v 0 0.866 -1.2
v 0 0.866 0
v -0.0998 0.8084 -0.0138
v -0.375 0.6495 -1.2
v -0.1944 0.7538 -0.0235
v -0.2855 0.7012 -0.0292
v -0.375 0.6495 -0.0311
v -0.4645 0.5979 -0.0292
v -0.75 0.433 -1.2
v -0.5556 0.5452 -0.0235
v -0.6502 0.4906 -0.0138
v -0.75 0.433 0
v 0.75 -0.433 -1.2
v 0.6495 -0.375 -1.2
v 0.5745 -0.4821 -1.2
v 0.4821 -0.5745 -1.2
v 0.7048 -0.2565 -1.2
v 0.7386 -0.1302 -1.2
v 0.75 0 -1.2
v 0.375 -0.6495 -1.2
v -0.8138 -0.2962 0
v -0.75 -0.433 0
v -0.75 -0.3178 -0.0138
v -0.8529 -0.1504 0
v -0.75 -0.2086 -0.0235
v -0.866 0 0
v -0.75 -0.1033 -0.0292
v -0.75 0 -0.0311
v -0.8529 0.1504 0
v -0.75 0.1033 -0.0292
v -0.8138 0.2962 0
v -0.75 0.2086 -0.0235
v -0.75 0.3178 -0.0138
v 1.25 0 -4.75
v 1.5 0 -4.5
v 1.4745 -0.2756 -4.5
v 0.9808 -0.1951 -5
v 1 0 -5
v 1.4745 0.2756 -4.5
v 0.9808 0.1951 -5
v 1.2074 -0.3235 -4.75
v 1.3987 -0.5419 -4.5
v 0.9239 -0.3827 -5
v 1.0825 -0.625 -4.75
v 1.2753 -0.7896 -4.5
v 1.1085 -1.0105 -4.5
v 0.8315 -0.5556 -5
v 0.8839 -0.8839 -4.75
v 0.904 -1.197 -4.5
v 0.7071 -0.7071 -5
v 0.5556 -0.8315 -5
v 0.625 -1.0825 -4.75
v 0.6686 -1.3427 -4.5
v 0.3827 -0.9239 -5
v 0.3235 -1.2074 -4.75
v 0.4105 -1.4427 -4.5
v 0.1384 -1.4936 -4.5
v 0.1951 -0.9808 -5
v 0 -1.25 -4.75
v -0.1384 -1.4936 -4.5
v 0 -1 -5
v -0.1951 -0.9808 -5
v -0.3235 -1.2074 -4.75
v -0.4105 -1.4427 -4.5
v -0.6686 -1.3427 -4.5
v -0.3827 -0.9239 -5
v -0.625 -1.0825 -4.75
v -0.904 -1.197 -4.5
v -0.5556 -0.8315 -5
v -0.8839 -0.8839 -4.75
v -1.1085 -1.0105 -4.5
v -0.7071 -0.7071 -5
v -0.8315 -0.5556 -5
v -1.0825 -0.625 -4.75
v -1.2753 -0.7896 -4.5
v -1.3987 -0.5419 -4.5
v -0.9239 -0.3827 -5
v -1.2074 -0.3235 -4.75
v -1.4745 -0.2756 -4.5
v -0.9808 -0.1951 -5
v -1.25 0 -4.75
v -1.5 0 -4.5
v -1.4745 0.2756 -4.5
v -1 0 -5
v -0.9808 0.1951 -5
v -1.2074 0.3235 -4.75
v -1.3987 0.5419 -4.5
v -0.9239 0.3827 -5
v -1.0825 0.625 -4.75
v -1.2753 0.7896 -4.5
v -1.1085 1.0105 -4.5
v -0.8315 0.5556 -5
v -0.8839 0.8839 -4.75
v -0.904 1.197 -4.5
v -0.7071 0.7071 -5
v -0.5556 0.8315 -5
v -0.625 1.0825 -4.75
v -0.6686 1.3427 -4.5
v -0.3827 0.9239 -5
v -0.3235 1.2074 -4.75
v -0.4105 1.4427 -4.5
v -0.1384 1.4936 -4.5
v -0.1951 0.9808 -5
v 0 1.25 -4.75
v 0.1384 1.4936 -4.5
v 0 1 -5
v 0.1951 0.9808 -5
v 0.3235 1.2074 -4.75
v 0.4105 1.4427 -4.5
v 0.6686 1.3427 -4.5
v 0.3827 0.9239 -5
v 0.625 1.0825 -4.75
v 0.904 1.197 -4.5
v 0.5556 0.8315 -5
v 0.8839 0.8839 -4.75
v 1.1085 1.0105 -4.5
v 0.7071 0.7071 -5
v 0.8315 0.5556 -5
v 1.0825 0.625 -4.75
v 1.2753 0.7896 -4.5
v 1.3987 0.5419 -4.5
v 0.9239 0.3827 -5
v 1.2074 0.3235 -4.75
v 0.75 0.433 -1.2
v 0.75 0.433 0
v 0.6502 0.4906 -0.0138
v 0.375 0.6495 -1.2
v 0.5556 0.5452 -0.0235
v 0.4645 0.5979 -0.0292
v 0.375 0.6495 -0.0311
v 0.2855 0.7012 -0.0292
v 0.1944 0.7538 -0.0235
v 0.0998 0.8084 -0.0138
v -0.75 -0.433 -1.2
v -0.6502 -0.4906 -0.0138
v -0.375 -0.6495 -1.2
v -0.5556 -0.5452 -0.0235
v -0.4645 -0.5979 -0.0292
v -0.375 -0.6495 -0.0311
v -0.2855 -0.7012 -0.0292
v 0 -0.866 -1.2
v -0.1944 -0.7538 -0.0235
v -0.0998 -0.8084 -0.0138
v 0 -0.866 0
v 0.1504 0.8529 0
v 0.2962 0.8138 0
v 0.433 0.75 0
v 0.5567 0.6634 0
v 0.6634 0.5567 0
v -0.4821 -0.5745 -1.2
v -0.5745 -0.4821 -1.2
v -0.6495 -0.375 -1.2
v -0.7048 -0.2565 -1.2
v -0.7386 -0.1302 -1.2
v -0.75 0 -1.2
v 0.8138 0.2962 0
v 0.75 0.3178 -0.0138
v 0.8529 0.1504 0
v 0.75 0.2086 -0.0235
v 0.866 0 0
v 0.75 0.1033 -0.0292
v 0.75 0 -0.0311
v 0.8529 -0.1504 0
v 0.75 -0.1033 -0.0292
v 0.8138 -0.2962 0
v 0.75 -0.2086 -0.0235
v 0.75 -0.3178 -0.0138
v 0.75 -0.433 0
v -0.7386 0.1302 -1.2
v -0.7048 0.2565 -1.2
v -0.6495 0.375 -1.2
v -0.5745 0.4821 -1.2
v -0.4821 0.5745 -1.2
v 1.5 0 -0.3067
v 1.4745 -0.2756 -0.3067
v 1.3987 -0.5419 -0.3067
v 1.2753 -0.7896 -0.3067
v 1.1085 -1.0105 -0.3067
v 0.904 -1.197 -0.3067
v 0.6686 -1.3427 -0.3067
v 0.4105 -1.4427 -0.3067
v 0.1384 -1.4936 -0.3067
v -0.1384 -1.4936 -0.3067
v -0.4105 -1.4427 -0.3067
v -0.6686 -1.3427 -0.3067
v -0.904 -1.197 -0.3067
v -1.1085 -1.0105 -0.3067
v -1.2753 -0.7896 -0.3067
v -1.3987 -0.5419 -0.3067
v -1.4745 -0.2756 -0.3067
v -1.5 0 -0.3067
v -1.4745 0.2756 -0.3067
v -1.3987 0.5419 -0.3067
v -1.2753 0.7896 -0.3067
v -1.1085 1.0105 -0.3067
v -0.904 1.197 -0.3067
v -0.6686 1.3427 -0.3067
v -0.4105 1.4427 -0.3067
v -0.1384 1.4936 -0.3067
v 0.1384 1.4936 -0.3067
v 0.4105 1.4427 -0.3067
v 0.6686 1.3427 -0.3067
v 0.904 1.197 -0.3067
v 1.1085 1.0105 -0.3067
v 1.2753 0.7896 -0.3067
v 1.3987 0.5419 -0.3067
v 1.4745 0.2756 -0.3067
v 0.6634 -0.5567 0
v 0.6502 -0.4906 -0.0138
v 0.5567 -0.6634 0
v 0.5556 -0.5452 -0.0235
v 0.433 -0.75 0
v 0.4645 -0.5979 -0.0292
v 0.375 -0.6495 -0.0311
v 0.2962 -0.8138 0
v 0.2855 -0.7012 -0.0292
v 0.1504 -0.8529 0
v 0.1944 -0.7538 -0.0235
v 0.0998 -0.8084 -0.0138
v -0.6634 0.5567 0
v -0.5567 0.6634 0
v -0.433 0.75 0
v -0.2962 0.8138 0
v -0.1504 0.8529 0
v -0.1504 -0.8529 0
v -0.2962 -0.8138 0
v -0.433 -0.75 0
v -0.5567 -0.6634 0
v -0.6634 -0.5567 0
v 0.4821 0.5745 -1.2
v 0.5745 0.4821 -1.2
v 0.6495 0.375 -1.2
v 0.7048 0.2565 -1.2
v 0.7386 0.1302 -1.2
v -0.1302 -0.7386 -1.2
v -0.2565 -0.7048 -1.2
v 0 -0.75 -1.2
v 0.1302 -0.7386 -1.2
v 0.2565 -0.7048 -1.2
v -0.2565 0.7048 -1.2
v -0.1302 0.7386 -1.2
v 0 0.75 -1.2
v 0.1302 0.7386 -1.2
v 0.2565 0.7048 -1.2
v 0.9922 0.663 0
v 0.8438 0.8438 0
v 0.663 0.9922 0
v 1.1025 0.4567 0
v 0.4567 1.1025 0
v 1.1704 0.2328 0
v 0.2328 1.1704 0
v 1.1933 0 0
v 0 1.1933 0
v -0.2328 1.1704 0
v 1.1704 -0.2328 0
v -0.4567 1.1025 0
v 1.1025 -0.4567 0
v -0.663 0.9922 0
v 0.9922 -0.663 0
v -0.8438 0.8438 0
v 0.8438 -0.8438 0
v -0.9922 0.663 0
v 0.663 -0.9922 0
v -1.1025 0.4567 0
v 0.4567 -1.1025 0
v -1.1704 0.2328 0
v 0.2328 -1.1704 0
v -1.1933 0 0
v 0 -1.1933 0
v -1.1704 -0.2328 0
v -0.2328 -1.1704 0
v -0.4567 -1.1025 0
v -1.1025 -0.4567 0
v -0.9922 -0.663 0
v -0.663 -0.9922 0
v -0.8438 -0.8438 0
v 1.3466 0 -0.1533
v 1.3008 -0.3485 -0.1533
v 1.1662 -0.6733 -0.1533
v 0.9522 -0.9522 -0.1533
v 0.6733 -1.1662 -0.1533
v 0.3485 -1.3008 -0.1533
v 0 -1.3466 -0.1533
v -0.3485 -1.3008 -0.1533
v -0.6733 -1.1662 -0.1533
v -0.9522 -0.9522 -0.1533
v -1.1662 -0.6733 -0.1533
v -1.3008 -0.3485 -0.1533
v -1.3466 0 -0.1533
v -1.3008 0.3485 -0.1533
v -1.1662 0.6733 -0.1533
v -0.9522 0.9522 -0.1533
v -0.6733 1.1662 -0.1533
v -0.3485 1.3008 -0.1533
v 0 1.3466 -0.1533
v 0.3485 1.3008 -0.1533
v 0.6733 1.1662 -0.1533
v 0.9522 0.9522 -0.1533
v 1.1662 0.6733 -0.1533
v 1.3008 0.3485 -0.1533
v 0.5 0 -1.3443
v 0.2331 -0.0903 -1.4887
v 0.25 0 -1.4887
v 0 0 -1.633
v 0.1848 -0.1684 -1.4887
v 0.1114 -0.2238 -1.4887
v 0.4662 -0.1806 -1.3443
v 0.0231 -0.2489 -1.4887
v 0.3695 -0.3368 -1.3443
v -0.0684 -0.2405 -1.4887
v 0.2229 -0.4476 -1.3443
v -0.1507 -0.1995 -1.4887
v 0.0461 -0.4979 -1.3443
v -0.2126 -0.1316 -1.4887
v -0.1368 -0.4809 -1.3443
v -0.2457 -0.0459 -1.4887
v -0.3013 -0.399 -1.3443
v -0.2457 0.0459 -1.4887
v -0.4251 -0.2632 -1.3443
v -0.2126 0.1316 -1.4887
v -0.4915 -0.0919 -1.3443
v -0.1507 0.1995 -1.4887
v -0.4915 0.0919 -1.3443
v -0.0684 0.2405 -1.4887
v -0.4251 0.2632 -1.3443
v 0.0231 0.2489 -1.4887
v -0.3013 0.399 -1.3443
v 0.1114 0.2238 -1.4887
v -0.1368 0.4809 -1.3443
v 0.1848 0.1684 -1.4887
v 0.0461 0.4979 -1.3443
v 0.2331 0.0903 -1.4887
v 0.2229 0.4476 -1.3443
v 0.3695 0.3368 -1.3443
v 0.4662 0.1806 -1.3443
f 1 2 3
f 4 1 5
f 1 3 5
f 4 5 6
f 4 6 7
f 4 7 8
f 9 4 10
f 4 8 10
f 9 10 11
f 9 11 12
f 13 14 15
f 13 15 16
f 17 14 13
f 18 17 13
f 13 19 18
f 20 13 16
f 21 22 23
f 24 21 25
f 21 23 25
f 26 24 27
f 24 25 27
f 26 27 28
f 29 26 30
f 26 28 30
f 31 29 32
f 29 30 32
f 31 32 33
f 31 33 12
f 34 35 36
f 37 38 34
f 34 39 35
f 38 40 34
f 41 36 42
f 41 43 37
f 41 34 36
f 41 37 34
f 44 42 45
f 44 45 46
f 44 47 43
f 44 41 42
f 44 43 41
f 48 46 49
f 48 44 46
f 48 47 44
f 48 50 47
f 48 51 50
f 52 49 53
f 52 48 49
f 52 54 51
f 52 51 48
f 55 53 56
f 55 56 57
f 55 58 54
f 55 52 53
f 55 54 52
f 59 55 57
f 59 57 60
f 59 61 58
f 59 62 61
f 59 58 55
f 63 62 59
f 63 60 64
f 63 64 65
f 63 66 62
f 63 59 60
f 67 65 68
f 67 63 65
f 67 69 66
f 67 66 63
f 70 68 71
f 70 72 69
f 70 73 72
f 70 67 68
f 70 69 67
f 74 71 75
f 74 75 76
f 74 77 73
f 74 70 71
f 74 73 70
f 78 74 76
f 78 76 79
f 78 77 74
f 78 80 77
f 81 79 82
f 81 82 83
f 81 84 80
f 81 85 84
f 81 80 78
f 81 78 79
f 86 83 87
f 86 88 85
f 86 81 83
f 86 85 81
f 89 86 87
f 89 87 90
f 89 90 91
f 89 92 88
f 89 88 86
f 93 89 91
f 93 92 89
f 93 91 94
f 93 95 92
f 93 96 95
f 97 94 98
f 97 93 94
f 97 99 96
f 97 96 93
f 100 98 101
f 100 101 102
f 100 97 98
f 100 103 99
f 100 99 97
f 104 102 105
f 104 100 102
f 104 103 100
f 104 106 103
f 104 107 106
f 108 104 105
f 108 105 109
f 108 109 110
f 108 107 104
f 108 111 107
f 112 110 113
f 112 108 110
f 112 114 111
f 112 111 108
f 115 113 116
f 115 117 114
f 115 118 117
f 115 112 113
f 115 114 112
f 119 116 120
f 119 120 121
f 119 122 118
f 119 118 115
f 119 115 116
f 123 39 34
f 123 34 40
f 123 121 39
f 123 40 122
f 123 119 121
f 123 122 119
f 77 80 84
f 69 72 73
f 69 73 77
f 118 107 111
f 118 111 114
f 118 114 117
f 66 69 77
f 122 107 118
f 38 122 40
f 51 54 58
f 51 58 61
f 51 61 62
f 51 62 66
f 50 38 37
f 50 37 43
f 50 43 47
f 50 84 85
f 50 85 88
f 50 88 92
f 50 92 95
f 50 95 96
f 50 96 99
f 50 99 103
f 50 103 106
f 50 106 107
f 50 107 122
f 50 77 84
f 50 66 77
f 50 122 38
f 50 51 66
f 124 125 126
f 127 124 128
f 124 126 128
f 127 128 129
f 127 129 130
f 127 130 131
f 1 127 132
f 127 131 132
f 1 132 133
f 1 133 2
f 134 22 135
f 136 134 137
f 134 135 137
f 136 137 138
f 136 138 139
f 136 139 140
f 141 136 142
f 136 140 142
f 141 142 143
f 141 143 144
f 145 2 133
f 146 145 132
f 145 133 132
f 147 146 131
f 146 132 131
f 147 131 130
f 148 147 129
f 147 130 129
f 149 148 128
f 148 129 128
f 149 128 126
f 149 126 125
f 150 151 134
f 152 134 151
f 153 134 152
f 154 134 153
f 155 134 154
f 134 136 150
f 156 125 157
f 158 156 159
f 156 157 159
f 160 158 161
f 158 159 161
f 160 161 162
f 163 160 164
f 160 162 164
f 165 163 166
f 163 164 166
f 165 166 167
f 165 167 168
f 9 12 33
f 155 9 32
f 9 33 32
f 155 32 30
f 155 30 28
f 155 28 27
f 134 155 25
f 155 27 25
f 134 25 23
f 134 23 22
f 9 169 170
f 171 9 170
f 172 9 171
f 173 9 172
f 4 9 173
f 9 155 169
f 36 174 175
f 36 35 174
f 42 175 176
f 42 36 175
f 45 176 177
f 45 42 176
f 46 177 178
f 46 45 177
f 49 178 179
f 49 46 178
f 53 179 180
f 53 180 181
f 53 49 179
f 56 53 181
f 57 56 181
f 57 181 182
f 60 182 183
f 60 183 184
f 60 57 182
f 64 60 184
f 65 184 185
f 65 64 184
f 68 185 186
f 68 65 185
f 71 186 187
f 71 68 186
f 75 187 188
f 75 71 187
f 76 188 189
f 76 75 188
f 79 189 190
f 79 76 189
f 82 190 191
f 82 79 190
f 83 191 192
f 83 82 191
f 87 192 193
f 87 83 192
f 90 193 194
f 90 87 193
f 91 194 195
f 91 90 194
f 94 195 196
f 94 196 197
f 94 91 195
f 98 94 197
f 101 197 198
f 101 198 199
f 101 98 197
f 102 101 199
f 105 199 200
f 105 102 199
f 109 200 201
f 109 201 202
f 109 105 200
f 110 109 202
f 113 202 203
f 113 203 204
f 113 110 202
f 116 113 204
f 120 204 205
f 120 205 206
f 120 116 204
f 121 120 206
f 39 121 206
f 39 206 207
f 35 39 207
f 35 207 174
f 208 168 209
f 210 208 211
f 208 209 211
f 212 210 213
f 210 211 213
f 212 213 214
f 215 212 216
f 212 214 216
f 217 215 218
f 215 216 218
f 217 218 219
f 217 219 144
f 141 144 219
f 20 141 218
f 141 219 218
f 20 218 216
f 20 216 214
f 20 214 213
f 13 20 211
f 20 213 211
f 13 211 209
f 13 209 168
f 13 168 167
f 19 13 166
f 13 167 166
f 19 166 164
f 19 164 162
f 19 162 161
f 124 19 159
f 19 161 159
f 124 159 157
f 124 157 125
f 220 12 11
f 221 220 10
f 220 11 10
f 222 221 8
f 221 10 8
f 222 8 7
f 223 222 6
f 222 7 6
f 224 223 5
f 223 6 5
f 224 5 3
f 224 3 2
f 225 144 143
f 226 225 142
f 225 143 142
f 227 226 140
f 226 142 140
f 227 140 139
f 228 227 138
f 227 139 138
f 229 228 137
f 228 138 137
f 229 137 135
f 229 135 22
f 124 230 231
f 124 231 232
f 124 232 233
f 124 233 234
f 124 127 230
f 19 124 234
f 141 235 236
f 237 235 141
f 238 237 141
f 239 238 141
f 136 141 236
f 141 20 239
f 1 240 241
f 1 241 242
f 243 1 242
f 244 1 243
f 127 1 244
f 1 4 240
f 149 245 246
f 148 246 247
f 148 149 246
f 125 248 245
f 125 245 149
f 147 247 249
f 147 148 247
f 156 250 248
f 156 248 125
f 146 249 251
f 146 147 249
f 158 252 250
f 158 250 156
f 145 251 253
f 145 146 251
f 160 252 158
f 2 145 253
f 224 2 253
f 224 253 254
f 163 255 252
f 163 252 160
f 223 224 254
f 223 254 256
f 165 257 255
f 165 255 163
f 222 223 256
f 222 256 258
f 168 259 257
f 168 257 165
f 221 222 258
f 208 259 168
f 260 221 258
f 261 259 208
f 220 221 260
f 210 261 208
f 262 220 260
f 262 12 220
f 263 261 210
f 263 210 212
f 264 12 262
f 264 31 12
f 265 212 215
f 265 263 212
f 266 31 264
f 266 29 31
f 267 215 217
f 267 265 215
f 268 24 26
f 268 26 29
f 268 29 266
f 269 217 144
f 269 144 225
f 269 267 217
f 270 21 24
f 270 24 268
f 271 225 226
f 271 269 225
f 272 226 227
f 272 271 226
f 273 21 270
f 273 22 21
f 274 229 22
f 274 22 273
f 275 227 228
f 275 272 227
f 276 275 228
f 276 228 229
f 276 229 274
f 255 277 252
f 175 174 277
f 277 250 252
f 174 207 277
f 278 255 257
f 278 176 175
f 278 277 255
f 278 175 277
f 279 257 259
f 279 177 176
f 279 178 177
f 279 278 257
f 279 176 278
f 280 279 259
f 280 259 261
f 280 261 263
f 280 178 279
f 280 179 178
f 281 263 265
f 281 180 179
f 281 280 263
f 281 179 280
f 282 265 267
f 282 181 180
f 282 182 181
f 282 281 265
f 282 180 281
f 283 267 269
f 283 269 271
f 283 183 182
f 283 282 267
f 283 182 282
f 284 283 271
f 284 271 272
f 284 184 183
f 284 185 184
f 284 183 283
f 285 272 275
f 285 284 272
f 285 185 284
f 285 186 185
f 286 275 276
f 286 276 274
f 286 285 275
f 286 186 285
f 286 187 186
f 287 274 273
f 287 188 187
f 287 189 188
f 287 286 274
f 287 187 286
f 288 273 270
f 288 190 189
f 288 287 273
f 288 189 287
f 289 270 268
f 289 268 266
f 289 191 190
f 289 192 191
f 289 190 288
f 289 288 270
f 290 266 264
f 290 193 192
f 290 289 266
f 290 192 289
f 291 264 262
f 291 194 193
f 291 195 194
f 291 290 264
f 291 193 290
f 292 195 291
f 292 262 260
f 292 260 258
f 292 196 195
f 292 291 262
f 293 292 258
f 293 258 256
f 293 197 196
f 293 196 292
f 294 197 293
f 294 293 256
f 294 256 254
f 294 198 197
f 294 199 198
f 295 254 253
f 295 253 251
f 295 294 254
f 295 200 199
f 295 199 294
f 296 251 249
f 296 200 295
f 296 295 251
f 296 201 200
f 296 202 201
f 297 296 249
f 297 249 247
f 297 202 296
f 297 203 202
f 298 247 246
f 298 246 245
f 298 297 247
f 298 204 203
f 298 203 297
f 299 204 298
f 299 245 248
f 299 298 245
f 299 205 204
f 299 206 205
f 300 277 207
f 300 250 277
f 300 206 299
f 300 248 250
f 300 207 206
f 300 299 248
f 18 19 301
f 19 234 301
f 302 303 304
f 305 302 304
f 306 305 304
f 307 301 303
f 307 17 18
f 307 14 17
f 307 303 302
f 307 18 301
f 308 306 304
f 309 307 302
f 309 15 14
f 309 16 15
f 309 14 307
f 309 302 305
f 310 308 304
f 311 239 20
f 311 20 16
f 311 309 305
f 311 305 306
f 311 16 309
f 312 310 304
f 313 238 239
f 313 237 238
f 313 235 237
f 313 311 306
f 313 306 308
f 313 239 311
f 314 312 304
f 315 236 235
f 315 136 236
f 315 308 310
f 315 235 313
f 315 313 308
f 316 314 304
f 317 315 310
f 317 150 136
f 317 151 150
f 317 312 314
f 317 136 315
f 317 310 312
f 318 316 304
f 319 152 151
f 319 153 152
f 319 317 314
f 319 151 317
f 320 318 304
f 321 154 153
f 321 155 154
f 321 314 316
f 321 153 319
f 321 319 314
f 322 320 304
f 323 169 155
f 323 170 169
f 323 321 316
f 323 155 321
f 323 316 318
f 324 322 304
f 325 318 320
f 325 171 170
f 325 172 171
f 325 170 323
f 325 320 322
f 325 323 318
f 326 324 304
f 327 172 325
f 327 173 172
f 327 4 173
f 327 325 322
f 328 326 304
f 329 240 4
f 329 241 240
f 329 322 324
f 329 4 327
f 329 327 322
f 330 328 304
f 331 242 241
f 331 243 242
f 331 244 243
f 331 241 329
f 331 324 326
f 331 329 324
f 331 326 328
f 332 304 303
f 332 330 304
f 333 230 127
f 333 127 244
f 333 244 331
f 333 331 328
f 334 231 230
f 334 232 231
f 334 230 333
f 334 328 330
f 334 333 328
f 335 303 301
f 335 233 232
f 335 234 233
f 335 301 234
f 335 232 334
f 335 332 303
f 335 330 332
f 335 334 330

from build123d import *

# Parameters (mm, degrees)
CUT_EXTRUDE1_DEPTH = 1.2


with BuildPart() as part:
    # Sketch1 → Revolve1 (revolve)
    with BuildSketch(Plane(origin=(0, 0, 0), x_dir=(0, 0, -1), z_dir=(1, 0, 0)), mode=Mode.PRIVATE) as revolve1_sk:
        Polygon((0.3067, 1.5), (4.5, 1.5), (5, 1), (5, 0), (1.633012702, 0), (1.2, 0.75), (0, 0.75), (0, 1.1933), align=None)
    revolve(revolve1_sk.sketch.rotate(Axis((0, 0, 0), (0, 0, -1)), 90), axis=Axis((0, 0, 0), (0, 0, -1)))

    # Sketch2 → Cut-Extrude1 (cut)
    with BuildSketch(Plane.XY):
        Polygon((0, 0.866025404), (-0.75, 0.433012702), (-0.75, -0.433012702), (0, -0.866025404), (0.75, -0.433012702), (0.75, 0.433012702), align=None)
    extrude(amount=-CUT_EXTRUDE1_DEPTH, mode=Mode.SUBTRACT)

    # Sketch3 → Cut-Revolve2 (revolve, cut)
    with BuildSketch(Plane(origin=(0, 0, 0), x_dir=(0, 0, -1), z_dir=(1, 0, 0))):
        Polygon((0, 0.75), (0, 0.866025404), (0.031088913, 0.75), align=None)
    revolve(axis=Axis((0, 0, 0), (0, 0, -1)), mode=Mode.SUBTRACT)


solid = part.part
